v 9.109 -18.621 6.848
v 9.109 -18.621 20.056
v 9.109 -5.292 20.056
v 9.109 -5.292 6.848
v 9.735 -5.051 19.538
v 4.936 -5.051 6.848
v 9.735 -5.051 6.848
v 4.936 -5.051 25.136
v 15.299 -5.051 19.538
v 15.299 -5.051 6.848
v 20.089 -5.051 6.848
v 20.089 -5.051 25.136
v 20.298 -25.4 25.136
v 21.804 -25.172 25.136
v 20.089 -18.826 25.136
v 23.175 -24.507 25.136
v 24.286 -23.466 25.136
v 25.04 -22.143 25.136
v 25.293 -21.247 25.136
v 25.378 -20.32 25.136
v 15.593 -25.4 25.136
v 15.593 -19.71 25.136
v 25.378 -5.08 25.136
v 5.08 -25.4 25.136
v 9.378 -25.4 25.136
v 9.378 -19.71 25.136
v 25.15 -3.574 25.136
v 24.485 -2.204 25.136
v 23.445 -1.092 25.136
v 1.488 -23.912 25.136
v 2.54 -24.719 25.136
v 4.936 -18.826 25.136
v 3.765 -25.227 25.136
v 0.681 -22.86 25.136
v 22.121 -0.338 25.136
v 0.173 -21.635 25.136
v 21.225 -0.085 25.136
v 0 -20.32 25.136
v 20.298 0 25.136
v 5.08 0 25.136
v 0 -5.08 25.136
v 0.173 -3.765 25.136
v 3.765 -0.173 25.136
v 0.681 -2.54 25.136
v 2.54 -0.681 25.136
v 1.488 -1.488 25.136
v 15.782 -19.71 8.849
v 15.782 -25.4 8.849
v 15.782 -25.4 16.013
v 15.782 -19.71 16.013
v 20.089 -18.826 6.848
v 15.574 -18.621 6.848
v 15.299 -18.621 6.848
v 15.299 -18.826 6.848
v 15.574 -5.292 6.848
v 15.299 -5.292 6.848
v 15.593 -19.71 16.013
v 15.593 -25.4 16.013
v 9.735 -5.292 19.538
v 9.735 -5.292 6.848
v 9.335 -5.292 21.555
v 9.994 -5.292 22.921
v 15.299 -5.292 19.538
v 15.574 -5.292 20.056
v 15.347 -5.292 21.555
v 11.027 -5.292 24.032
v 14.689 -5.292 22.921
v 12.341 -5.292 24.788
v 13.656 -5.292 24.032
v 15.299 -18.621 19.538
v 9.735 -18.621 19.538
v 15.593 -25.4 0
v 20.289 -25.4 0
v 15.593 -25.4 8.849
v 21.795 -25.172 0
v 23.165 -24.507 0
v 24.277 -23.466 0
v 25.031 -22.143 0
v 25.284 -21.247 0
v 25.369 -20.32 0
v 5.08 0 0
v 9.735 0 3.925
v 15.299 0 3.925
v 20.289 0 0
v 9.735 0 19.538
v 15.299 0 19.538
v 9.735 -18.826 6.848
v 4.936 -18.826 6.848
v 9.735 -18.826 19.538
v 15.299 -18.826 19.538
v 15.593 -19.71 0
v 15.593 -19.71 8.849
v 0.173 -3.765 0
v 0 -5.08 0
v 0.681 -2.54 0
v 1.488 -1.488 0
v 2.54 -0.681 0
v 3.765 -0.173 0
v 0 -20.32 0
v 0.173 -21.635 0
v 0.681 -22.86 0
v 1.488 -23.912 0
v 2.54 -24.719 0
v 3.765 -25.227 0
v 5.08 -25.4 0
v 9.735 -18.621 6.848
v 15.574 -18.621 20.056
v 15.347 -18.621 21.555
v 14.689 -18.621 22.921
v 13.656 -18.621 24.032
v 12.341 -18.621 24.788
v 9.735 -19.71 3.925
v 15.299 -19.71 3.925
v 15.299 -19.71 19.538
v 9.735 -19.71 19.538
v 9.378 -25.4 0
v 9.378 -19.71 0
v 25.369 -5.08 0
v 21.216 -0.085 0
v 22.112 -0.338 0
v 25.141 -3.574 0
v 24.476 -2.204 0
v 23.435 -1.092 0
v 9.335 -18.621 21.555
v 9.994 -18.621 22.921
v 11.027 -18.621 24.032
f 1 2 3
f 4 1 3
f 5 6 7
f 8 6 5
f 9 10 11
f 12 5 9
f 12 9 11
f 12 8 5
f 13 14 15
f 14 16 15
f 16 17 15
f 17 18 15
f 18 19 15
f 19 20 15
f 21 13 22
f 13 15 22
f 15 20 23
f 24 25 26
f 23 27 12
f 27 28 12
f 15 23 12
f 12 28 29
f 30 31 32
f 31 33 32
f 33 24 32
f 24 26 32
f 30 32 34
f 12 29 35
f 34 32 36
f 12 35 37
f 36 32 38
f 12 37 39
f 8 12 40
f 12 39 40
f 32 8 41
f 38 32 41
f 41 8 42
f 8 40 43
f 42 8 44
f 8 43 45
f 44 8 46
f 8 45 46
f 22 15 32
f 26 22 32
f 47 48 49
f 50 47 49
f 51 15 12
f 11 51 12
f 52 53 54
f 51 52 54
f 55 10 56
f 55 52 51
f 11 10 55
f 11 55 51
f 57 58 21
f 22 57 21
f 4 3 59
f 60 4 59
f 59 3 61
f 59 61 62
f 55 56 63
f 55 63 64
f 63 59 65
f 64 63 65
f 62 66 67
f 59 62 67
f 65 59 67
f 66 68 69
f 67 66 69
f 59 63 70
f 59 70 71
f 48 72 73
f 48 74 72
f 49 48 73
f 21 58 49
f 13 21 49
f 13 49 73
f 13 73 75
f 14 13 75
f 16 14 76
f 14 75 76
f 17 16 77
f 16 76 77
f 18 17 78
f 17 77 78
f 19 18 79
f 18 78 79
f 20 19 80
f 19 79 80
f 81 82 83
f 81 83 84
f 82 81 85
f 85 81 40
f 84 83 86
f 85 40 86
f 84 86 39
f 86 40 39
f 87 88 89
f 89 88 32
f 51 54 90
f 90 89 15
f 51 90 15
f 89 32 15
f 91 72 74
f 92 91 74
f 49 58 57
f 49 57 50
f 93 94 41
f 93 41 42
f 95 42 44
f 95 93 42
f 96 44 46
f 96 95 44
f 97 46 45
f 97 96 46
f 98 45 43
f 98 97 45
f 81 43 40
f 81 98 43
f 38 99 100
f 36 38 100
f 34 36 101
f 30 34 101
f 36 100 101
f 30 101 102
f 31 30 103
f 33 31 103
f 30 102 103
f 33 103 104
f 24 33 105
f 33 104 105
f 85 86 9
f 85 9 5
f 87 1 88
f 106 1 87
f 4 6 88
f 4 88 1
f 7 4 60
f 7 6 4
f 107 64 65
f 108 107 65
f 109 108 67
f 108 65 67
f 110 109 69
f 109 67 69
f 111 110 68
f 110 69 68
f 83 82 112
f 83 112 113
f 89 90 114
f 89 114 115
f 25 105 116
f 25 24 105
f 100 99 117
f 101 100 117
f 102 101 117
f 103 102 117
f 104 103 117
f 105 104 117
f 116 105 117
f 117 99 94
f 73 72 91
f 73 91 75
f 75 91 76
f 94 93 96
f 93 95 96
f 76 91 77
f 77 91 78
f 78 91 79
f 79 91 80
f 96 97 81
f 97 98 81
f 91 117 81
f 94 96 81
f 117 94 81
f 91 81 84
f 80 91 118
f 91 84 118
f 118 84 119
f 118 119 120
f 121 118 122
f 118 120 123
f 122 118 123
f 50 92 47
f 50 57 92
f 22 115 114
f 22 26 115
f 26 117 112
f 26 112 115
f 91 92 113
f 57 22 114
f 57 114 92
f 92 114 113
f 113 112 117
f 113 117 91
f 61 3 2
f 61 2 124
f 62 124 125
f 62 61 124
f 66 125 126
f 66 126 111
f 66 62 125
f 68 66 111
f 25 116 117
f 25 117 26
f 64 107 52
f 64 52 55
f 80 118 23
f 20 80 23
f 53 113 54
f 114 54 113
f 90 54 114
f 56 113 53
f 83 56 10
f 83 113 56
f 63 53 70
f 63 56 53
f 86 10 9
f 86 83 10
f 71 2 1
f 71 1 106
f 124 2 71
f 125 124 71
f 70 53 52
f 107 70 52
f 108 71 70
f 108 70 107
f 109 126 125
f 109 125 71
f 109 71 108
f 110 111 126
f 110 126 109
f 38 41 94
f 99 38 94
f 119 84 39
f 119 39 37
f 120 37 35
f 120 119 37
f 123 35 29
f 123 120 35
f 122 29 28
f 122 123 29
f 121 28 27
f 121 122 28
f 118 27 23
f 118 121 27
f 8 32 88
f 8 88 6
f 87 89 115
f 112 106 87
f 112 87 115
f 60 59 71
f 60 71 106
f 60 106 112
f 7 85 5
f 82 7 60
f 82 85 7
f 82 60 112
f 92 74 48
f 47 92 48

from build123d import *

# Parameters (mm, degrees)
F1_DEPTH     = 25.4
F2_W         = 15.1525349356
F2_H         = 13.7750366703
F3_DEPTH     = 18.288
F4_W         = 6.4649451524
F4_H         = 13.3289596997
F5_DEPTH     = 22.4028
F7_T1_DEPTH  = 25.1356456429
F7_T3_DEPTH  = 13.3289596997
F7_T8_DEPTH  = 50.5356473019
F7_T14_DEPTH = 50.5356473019
F8_W         = 0.189450098
F8_H         = 7.1646480085
F6_W         = 6.2150303274
F6_H         = 25.1356456429
F9_DEPTH     = 5.6896
F11_DEPTH    = 65.1764


# Not quite as in the source:
# - a fillet or chamfer that OpenCascade refuses, or shapes differently, is made with other operations: its cross-section is extruded or revolved along the edge and cut away or added


with BuildPart() as f1:
    # F0 (on Front) → F1 (new body)
    with BuildSketch(Plane.XZ):
        Polygon((0, 25.1356456429), (0, 0), (25.3690239042, 0), (25.3781564534, 25.1356456429), align=None)
    extrude(amount=F1_DEPTH)

    # F2 (on face) → F3 (cut)
    with BuildSketch(Plane.XY.offset(25.1356456429)):
        with Locations((12.512326939, -11.9383647107)):
            Rectangle(F2_W, F2_H)
    extrude(amount=-F3_DEPTH, mode=Mode.SUBTRACT)

    # F4 (on face) → F5 (join)
    with BuildSketch(Plane.XY.offset(25.1356456429)):
        with Locations((12.3413000256, -11.9561098982)):
            Rectangle(F4_W, F4_H)
    extrude(amount=-F5_DEPTH)

    # F7: fillet of radius 5.08 on 6 edges, made by hand

    # F7_s2 → F7_t1 (cut)
    with BuildSketch(Plane.XY):
        with BuildLine():
            ThreePointArc((0, -20.32), (1.4878975516, -23.9121024484), (5.08, -25.4))
            Line((5.08, -25.4), (5.08, -25.5016))
            Line((5.08, -25.5016), (-0.1016, -25.5016))
            Line((-0.1016, -25.5016), (-0.1016, -20.32))
            Line((-0.1016, -20.32), (0, -20.32))
        make_face()
        with BuildLine():
            ThreePointArc((0, -5.08), (1.4878975516, -1.4878975516), (5.08, 0))
            Line((5.08, 0), (5.08, 0.1016))
            Line((5.08, 0.1016), (-0.1016, 0.1016))
            Line((-0.1016, 0.1016), (-0.1016, -5.08))
            Line((-0.1016, -5.08), (0, -5.08))
        make_face()
    extrude(amount=F7_T1_DEPTH, mode=Mode.SUBTRACT)

    # F7_s4 → F7_t3 (cut)
    with BuildSketch(Plane.XZ.offset(5.2916300483)):
        with BuildLine():
            ThreePointArc((9.1088274494, 20.0556456429), (10.596725001, 23.6477480913), (14.1888274494, 25.1356456429))
            Line((14.1888274494, 25.1356456429), (14.1888274494, 25.2372456429))
            Line((14.1888274494, 25.2372456429), (9.0072274494, 25.2372456429))
            Line((9.0072274494, 25.2372456429), (9.0072274494, 20.0556456429))
            Line((9.0072274494, 20.0556456429), (9.1088274494, 20.0556456429))
        make_face()
        with BuildLine():
            ThreePointArc((15.5737726018, 20.0556456429), (14.0858750502, 23.6477480913), (10.4937726018, 25.1356456429))
            Line((10.4937726018, 25.1356456429), (10.4937726018, 25.2372456429))
            Line((10.4937726018, 25.2372456429), (15.6753726018, 25.2372456429))
            Line((15.6753726018, 25.2372456429), (15.6753726018, 20.0556456429))
            Line((15.6753726018, 20.0556456429), (15.5737726018, 20.0556456429))
        make_face()
    extrude(amount=F7_T3_DEPTH, mode=Mode.SUBTRACT)


with BuildPart() as f7_tool6:
    # F7_s7 → F7_t8 (new body)
    with BuildSketch(Plane(origin=(-0.0046109493, 0, -12.6907818203), x_dir=(0, 1, 0), z_dir=(0.0003633306, 0, 0.999999934))):
        with BuildLine():
            ThreePointArc((-25.4, -20.2890222297), (-23.9121024484, -23.8811246782), (-20.32, -25.3690222297))
            Line((-20.32, -25.3690222297), (-20.32, -25.4706222297))
            Line((-20.32, -25.4706222297), (-25.5016, -25.4706222297))
            Line((-25.5016, -25.4706222297), (-25.5016, -20.2890222297))
            Line((-25.5016, -20.2890222297), (-25.4, -20.2890222297))
        make_face()
    extrude(amount=F7_T8_DEPTH)

    split(bisect_by=Plane.XY.offset(25.1356456429), keep=Keep.BOTTOM)

    split(bisect_by=Plane.XY, keep=Keep.TOP)


with BuildPart() as f1_1:
    add(f1.part)

    # F7_t5: cut F7_tool6
    add(f7_tool6.part, mode=Mode.SUBTRACT)


with BuildPart() as f7_tool12:
    # F7_s13 → F7_t14 (new body)
    with BuildSketch(Plane(origin=(-0.0046109493, 0, -12.6907818203), x_dir=(0, 1, 0), z_dir=(0.0003633306, 0, 0.999999934))):
        with BuildLine():
            ThreePointArc((0, -20.2890222297), (-1.4878975516, -23.8811246782), (-5.08, -25.3690222297))
            Line((-5.08, -25.3690222297), (-5.08, -25.4706222297))
            Line((-5.08, -25.4706222297), (0.1016, -25.4706222297))
            Line((0.1016, -25.4706222297), (0.1016, -20.2890222297))
            Line((0.1016, -20.2890222297), (0, -20.2890222297))
        make_face()
    extrude(amount=F7_T14_DEPTH)

    split(bisect_by=Plane.XY.offset(25.1356456429), keep=Keep.BOTTOM)

    split(bisect_by=Plane.XY, keep=Keep.TOP)


with BuildPart() as f1_2:
    add(f1_1.part)

    # F7_t11: cut F7_tool12
    add(f7_tool12.part, mode=Mode.SUBTRACT)

    # F8 (on face) + F6 (on face) → F9 (cut)
    with BuildSketch(Plane.XZ.offset(25.4)):
        with Locations((15.687267526, 12.4311717227)):
            Rectangle(F8_W, F8_H)
    with BuildSketch(Plane.XZ.offset(25.4)):
        with Locations((12.4850273132, 12.5678228214)):
            Rectangle(F6_W, F6_H)
    extrude(amount=-F9_DEPTH, mode=Mode.SUBTRACT)

    # F10 (on face) → F11 (cut)
    with BuildSketch(Plane.XZ):
        Polygon((15.2985183522, 3.9248324286), (15.2985183522, 15.5202150633), (15.2985183522, 19.5378263631), (9.7349686548, 19.5378263631), (9.7349686548, 3.9248324286), align=None)
    extrude(amount=F11_DEPTH, mode=Mode.SUBTRACT)


solid = f1_2.part
